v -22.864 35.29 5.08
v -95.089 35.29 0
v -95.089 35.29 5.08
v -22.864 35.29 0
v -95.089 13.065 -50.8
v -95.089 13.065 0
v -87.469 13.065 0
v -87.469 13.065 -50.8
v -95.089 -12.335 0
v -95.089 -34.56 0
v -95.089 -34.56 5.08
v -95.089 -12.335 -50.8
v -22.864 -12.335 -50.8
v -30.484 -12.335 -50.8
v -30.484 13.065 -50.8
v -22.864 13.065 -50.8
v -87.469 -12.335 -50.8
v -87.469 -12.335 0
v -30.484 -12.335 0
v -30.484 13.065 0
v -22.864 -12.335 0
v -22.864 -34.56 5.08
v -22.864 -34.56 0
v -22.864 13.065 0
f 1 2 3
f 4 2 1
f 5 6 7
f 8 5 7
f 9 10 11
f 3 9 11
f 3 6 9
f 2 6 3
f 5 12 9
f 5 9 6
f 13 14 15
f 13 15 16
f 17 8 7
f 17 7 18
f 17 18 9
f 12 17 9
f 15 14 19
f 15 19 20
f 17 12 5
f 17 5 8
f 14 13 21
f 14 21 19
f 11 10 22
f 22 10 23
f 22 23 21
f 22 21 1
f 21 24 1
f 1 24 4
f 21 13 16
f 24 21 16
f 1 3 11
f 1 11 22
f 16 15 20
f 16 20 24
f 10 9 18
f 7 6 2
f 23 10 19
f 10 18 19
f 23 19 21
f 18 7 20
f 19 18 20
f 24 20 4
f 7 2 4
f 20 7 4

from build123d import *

# Parameters (mm, degrees)
F0_W     = 72.225
F0_H     = 69.85
F1_DEPTH = 5.08
F3_DEPTH = 50.8


with BuildPart() as f1:
    # F0 (on Top) → F1 (new body)
    with BuildSketch(Plane.XY):
        with Locations((-58.976147, 0.364591)):
            Rectangle(F0_W, F0_H)
    extrude(amount=F1_DEPTH)

    # F2 (on face) → F3 (join)
    with BuildSketch(Plane(origin=(0, 0, 0), x_dir=(1, 0, 0), z_dir=(0, 0, -1))):
        Polygon((-95.088647, 12.335409), (-95.088647, -0.364591), (-95.088647, -13.064591), (-87.468647, -13.064591), (-87.468647, 12.335409), align=None)
        Polygon((-22.863647, -0.364591), (-22.863647, 12.335409), (-30.483647, 12.335409), (-30.483647, -13.064591), (-22.863647, -13.064591), align=None)
    extrude(amount=F3_DEPTH)


solid = f1.part
